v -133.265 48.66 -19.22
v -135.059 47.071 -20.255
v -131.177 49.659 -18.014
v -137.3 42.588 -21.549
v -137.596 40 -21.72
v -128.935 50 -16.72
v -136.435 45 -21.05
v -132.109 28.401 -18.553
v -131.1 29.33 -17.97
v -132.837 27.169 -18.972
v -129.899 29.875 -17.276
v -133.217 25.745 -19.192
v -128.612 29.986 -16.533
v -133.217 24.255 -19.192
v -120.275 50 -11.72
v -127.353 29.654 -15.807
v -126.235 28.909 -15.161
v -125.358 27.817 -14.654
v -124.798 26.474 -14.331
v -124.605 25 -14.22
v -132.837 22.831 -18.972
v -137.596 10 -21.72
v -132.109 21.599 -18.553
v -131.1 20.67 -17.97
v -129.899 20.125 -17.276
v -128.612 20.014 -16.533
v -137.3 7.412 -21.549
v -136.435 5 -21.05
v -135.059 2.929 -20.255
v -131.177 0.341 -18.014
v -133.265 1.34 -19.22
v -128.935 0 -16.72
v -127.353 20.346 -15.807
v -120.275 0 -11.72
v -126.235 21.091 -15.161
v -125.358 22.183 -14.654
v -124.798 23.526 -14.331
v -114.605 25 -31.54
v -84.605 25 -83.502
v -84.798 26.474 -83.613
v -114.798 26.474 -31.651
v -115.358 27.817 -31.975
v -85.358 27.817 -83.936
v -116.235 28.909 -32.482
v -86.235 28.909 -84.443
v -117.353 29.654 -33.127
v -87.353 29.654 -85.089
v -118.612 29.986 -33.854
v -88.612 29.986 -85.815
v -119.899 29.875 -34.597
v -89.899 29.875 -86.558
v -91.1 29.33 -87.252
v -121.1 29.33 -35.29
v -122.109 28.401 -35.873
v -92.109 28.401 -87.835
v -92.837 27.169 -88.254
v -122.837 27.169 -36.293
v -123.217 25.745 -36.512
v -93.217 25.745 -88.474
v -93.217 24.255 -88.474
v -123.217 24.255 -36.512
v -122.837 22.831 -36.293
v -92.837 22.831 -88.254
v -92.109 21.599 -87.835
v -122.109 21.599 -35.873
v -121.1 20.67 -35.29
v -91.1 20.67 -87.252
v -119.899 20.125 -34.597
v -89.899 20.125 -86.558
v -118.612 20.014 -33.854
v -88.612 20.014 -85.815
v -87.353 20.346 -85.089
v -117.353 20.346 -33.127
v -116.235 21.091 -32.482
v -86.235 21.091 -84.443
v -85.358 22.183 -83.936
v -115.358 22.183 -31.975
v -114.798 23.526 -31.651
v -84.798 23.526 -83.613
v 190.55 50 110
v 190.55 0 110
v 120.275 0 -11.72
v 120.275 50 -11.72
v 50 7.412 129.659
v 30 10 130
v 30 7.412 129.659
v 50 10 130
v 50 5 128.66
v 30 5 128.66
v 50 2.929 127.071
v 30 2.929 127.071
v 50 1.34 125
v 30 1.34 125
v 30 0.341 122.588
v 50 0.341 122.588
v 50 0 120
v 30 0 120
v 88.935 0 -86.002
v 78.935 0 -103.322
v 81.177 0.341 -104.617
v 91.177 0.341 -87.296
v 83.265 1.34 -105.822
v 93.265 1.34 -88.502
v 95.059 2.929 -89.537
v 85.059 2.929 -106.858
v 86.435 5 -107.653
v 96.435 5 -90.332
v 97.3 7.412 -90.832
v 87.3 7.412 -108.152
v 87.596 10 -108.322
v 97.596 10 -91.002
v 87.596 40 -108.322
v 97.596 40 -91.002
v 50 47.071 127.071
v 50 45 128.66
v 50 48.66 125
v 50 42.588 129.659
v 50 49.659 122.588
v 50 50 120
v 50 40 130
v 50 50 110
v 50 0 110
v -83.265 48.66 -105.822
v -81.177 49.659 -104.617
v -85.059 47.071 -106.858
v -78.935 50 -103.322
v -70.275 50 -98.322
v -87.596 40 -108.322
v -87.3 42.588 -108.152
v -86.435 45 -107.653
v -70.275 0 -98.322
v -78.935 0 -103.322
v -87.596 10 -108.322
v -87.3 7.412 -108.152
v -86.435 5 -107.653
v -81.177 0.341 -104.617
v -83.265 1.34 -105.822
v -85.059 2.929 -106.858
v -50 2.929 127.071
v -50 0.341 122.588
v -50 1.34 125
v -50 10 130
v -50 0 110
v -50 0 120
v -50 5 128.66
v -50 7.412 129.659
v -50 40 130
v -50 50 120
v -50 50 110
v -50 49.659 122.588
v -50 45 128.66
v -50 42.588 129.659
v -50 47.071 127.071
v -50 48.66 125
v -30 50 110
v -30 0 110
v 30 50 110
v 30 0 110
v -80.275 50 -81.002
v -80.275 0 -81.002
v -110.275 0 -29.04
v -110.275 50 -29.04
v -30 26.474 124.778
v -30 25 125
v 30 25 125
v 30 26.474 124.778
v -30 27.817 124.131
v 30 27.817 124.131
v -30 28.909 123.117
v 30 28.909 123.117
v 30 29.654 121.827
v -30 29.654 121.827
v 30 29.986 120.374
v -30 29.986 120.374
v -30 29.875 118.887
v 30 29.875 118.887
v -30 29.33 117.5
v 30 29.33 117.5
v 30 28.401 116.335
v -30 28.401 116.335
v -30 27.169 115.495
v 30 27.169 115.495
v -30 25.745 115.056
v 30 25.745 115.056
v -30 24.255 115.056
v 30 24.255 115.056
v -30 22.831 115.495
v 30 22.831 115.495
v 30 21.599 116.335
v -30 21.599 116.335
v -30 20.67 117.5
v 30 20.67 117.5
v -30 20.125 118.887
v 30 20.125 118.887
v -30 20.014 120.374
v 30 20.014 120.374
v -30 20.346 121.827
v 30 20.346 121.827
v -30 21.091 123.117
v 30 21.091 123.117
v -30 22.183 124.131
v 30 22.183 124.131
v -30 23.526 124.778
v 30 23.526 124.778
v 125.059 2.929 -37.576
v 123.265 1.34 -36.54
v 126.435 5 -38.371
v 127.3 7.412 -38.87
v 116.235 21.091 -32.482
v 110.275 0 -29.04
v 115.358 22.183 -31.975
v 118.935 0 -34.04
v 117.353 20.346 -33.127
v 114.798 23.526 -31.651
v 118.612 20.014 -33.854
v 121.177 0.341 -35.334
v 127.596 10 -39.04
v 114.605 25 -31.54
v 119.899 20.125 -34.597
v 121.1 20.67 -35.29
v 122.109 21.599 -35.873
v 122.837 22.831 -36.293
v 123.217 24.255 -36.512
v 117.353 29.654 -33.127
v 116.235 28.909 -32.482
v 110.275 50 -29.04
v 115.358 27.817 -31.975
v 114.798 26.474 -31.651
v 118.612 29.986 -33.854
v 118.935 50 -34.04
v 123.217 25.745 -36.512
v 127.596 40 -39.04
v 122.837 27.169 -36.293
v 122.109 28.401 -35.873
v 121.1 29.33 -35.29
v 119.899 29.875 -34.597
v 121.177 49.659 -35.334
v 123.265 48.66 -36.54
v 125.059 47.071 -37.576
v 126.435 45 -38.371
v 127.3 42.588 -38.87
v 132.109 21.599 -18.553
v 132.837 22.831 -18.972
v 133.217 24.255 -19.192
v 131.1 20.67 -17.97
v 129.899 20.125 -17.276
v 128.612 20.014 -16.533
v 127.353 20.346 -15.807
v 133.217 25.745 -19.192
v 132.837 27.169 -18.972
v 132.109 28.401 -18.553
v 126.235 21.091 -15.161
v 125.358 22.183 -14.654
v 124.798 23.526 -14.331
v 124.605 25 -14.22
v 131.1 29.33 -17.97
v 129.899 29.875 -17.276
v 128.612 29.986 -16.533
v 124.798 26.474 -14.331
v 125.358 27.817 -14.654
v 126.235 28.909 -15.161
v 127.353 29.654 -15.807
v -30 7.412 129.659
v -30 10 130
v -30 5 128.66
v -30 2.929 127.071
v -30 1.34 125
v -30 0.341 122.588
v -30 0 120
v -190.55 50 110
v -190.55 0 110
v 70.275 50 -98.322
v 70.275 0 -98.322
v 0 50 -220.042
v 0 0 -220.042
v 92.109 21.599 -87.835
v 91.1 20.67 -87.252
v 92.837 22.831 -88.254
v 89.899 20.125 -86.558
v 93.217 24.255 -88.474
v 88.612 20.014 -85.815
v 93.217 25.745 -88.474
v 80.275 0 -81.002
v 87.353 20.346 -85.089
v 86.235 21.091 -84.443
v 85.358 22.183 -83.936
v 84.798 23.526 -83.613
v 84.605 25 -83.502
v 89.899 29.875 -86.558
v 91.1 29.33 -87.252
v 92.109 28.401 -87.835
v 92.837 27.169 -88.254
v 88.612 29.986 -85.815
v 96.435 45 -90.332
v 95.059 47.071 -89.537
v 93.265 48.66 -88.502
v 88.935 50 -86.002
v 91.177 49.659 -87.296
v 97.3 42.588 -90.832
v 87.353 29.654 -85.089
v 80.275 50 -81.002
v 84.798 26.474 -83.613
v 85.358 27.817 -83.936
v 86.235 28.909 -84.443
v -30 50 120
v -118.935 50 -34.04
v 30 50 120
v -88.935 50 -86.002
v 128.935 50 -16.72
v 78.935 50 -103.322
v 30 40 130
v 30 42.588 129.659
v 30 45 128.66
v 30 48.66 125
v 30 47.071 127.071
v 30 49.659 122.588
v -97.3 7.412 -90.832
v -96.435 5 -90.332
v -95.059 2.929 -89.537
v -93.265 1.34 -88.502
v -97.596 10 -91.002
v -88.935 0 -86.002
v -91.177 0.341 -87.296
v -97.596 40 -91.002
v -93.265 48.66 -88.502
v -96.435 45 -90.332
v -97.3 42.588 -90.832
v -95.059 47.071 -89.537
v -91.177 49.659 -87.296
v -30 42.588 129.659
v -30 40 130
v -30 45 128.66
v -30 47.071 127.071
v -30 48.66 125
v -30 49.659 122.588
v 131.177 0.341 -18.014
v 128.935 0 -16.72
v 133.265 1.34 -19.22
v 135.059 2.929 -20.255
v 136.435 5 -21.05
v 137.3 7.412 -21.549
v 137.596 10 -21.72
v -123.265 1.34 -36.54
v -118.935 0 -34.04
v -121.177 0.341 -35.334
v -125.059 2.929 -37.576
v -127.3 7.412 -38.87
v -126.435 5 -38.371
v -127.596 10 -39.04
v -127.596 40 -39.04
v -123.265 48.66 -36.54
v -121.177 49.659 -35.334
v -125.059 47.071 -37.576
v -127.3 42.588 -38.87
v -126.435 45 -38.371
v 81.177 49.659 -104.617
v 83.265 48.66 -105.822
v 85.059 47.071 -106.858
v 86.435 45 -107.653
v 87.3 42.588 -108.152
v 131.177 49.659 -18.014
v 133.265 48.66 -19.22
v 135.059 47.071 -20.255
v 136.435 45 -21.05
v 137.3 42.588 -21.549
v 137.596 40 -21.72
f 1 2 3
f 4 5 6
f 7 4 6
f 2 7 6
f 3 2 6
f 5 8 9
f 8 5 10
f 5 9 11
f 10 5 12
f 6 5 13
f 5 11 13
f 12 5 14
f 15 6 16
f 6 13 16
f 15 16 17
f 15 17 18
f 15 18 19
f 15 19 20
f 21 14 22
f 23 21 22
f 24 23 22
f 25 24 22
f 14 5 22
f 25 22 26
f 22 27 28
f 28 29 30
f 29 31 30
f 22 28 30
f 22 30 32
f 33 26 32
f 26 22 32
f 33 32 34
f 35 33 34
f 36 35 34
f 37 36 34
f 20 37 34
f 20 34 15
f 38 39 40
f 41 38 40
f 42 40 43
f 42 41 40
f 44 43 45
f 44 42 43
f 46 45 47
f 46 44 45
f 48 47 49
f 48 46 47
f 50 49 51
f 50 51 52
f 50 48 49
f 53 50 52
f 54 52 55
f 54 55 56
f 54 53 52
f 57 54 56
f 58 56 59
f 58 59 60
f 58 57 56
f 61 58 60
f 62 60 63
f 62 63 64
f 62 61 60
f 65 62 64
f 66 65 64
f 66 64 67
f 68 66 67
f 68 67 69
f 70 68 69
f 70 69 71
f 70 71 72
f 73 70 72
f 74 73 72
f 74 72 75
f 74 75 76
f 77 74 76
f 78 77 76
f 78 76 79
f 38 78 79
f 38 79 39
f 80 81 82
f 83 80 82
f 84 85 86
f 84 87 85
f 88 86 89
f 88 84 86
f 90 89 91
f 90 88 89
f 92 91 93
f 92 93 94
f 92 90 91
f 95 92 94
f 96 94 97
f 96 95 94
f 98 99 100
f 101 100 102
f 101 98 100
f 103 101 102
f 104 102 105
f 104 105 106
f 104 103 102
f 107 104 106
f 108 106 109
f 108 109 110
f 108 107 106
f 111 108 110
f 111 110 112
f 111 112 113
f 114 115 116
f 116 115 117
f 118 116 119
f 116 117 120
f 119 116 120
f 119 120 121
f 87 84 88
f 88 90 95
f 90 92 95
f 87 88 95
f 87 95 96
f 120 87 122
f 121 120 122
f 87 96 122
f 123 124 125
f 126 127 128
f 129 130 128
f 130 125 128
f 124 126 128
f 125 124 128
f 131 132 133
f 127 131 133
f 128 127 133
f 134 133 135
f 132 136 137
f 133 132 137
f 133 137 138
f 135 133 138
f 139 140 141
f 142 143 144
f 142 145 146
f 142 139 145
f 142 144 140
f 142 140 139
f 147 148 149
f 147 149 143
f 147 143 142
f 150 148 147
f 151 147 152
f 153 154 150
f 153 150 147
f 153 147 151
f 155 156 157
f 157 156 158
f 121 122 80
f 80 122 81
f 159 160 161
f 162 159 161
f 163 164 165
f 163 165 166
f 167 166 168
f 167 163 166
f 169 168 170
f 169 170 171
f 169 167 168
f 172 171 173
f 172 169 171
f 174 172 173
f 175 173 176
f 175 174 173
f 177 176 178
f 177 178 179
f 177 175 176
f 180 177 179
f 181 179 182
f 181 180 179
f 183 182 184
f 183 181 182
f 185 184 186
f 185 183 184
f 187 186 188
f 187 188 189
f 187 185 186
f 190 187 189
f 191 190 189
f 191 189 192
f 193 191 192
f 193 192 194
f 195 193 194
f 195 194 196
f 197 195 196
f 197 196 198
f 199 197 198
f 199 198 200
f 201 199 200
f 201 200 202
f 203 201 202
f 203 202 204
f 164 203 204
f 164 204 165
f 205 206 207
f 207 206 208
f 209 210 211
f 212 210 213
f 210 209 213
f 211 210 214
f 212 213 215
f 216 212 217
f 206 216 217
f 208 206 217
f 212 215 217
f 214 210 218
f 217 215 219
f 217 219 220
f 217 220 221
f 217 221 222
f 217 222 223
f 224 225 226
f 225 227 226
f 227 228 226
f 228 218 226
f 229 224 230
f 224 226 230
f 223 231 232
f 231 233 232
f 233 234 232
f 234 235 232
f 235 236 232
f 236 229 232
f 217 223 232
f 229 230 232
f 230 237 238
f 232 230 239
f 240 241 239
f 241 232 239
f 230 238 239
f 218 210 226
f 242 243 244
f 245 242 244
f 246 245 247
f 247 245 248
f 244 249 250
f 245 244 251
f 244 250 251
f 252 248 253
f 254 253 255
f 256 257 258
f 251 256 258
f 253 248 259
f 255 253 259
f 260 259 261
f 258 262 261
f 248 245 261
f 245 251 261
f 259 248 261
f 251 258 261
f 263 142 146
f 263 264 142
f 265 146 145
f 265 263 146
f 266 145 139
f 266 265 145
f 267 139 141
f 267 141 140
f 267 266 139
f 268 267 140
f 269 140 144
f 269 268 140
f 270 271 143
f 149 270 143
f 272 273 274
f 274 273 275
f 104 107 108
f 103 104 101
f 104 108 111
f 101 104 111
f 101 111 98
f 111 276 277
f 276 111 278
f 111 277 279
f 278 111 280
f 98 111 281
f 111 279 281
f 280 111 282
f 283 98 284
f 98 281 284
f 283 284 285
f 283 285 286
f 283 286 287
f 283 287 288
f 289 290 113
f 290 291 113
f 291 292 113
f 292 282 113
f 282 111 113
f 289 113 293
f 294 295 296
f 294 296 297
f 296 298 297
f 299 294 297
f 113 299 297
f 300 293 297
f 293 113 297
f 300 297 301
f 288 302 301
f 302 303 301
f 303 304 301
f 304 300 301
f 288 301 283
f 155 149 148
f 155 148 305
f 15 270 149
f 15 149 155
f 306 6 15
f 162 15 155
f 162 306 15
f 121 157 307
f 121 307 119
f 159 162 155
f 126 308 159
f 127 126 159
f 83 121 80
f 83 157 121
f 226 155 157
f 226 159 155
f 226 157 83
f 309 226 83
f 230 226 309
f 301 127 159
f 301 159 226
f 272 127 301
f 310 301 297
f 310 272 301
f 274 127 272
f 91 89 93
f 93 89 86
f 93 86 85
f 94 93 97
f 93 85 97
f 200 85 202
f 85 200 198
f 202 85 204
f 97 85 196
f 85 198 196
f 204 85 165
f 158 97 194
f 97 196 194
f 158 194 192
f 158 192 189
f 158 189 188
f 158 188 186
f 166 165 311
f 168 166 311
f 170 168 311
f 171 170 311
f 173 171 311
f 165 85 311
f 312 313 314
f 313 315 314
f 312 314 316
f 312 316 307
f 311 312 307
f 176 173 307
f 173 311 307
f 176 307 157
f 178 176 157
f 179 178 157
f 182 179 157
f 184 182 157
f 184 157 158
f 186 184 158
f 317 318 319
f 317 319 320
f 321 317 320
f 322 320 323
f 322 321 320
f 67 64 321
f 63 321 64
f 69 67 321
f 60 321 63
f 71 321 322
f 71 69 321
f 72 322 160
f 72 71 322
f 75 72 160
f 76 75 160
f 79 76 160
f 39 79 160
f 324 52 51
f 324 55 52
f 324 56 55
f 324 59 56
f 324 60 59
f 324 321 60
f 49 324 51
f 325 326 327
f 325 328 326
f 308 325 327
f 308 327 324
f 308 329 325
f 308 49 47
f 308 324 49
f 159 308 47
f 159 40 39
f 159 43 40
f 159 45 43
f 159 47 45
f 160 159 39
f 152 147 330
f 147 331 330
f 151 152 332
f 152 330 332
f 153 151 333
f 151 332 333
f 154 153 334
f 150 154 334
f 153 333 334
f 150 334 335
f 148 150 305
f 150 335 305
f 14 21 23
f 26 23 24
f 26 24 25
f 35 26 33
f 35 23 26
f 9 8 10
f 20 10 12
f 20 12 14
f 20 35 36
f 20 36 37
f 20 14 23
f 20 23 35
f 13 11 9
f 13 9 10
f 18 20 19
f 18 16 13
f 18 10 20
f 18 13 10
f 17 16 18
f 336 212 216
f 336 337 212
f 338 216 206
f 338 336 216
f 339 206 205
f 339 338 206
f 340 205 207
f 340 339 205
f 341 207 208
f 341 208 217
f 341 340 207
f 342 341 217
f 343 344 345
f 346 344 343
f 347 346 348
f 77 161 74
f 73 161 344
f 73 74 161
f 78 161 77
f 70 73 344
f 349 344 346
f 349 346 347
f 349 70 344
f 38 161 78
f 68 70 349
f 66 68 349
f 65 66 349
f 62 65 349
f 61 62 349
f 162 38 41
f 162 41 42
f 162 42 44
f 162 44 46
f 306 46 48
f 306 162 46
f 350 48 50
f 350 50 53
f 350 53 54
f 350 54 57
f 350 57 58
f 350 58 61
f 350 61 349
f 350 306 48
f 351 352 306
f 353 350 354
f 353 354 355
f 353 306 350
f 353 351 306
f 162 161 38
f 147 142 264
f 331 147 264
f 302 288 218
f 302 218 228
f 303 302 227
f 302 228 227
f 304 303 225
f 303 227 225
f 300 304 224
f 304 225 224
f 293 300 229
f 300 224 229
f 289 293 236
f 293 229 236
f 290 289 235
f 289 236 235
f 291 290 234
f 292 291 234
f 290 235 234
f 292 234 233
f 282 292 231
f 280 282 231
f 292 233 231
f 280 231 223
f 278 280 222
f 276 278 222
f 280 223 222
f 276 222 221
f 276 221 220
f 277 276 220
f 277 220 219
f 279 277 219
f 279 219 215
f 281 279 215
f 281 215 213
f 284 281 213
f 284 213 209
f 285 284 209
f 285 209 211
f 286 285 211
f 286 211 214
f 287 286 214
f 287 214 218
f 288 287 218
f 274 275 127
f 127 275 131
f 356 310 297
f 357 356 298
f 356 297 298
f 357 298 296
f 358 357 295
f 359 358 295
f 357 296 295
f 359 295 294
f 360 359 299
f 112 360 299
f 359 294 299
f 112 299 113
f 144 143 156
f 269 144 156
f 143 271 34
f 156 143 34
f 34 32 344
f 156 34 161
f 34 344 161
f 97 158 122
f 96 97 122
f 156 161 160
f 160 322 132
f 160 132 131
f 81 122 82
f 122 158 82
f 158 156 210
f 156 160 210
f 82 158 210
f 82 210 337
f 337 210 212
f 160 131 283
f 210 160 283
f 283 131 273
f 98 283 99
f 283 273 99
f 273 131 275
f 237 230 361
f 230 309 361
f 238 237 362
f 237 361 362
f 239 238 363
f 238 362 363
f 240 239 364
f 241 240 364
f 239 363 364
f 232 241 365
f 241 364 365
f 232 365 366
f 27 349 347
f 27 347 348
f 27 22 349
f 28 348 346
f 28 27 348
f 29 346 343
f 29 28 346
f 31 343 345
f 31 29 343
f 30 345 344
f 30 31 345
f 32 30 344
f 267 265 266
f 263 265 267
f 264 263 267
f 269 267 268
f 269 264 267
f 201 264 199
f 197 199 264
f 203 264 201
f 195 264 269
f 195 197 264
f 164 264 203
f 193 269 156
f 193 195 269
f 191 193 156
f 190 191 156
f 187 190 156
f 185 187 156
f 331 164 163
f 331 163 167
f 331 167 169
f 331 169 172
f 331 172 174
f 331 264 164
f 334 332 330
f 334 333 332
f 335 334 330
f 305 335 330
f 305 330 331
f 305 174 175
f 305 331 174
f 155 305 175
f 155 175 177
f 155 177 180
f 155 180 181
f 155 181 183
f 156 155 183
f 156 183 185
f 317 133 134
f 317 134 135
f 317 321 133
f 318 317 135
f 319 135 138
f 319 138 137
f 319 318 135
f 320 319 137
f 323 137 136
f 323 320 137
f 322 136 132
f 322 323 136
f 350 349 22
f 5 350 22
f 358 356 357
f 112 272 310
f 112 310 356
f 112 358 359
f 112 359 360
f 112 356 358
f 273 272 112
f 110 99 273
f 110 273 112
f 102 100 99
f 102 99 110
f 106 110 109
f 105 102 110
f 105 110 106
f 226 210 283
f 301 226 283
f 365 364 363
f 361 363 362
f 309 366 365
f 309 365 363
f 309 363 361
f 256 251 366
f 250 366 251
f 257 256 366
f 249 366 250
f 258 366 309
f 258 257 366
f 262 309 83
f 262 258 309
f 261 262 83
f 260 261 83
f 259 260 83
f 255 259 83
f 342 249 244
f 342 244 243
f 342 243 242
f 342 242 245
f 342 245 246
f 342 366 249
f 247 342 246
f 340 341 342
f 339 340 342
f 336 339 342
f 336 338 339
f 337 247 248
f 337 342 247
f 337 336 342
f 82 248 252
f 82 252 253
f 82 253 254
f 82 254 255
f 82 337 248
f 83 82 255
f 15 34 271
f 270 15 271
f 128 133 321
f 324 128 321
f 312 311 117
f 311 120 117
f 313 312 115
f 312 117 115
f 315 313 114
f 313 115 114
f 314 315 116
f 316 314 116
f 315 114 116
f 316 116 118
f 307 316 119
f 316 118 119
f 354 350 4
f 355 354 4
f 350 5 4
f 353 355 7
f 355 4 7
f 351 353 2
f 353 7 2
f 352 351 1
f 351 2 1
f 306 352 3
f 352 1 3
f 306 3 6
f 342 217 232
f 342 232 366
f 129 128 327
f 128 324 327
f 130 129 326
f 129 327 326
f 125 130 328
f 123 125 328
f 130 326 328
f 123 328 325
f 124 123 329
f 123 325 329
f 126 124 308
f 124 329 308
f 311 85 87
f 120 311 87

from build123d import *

# Parameters (mm, degrees)
BOSS_EXTRUDE1_DEPTH   = 50
BOSS_EXTRUDE2_DEPTH   = 50
BOSS_EXTRUDE2_2_DEPTH = 50
SKETCH3_W             = 100
SKETCH3_H             = 20
BOSS_EXTRUDE2_3_DEPTH = 50
SKETCH4_W             = 60
SKETCH4_H             = 20
CUT_EXTRUDE1_DEPTH    = 50
FILLET1_R             = 10
FILLET2_R             = 10
FILLET3_R             = 10
FILLET4_R             = 10
FILLET5_R             = 10
FILLET6_R             = 10
FILLET7_R             = 10
SKETCH5_R             = 5
BOSS_EXTRUDE3_DEPTH   = 80
SKETCH6_R             = 5
BOSS_EXTRUDE4_DEPTH   = 80


with BuildPart() as part:
    # Sketch1 → Boss-Extrude1 (new body)
    with BuildSketch(Plane(origin=(0, 0, 0), x_dir=(1, 0, 0), z_dir=(0, 1, 0))):
        Polygon((-190.55, -110), (190.55, -110), (0, 220.042281382), align=None)
    extrude(amount=BOSS_EXTRUDE1_DEPTH)


with BuildPart() as body_2:
    # Sketch3 → Boss-Extrude2 (new body)
    with BuildSketch(Plane(origin=(0, 0, 0), x_dir=(1, 0, 0), z_dir=(0, 1, 0))):
        Polygon((-128.935254038, 16.719870502), (-111.614745962, 6.719870502), (-61.614745962, 93.32241088), (-78.935254038, 103.32241088), align=None)
    extrude(amount=BOSS_EXTRUDE2_DEPTH)


with BuildPart() as body_3:
    # Sketch3 → Boss-Extrude2 2 (new body)
    with BuildSketch(Plane(origin=(0, 0, 0), x_dir=(1, 0, 0), z_dir=(0, 1, 0))):
        Polygon((111.614745962, 6.719870502), (61.614745962, 93.32241088), (78.935254038, 103.32241088), (128.935254038, 16.719870502), align=None)
    extrude(amount=BOSS_EXTRUDE2_2_DEPTH)


with BuildPart() as body_4:
    # Sketch3 → Boss-Extrude2 3 (new body)
    with BuildSketch(Plane(origin=(0, 0, 0), x_dir=(1, 0, 0), z_dir=(0, 1, 0))):
        with Locations((0, -110)):
            Rectangle(SKETCH3_W, SKETCH3_H)
    extrude(amount=BOSS_EXTRUDE2_3_DEPTH)


with BuildPart() as body_2_1:
    # Body-Move/Copy1: read off the stored shape, not the designer's step
    # Body-Move/Copy1: moved
    add(body_2.part.moved(Location((-8.660254, 0, -5))))


with BuildPart() as body_3_1:
    # Body-Move/Copy2: read off the stored shape, not the designer's step
    # Body-Move/Copy2: moved
    add(body_3.part.moved(Location((8.660254, 0, -5))))


with BuildPart() as body_4_1:
    # Body-Move/Copy3: read off the stored shape, not the designer's step
    # Body-Move/Copy3: moved
    add(body_4.part.moved(Location((0, 0, 10))))


with BuildPart() as cut_extrude1_tool:
    # Sketch4 → Cut-Extrude1 (new body)
    with BuildSketch(Plane(origin=(0, 50, 0), x_dir=(1, 0, 0), z_dir=(0, 1, 0))):
        Polygon((-97.595508076, 91.001902805), (-80.275, 81.001902805), (-110.275, 29.040378578), (-127.595508076, 39.040378578), align=None)
        Polygon((127.595508076, 39.040378578), (97.595508076, 91.001902805), (80.275, 81.001902805), (110.275, 29.040378578), align=None)
        with Locations((0, -120)):
            Rectangle(SKETCH4_W, SKETCH4_H)
    extrude(amount=-CUT_EXTRUDE1_DEPTH)


with BuildPart() as body_2_2:
    add(body_2_1.part)

    # Cut-Extrude1: cut by cut_extrude1_tool
    add(cut_extrude1_tool.part, mode=Mode.SUBTRACT)


with BuildPart() as body_3_2:
    add(body_3_1.part)

    # Cut-Extrude1: cut by cut_extrude1_tool
    add(cut_extrude1_tool.part, mode=Mode.SUBTRACT)


with BuildPart() as body_4_2:
    add(body_4_1.part)

    # Cut-Extrude1: cut by cut_extrude1_tool
    add(cut_extrude1_tool.part, mode=Mode.SUBTRACT)


with BuildPart() as cut_extrude1_piece_1:
    # of the separate pieces the step leaves, piece 1, a body of its own (cut_extrude1_pieces)
    add(body_2_2.part.solids().sort_by_distance((-87.595508038, 0, -108.32241088))[0])

    # Fillet1
    fillet1_edges = [cut_extrude1_piece_1.edges().sort_by_distance(p)[0] for p in [
        (-92.595508043, 0, -99.662156834),
        (-92.595508043, 50, -99.662156834),
    ]]
    fillet(fillet1_edges, radius=FILLET1_R)


with BuildPart() as cut_extrude1_piece_2:
    # of the separate pieces the step leaves, piece 2, a body of its own (cut_extrude1_pieces)
    add(body_2_2.part.solids().sort_by_distance((-137.595508038, 0, -21.719870502))[0])

    # Fillet2
    fillet2_edges = [cut_extrude1_piece_2.edges().sort_by_distance(p)[0] for p in [
        (-132.595508043, 0, -30.380124532),
        (-132.595508043, 50, -30.380124532),
    ]]
    fillet(fillet2_edges, radius=FILLET2_R)


with BuildPart() as cut_extrude1_piece_1_of_body_3:
    # of the separate pieces the step leaves, piece 1, a body of its own (cut_extrude1_pieces_of_body_3)
    add(body_3_2.part.solids().sort_by_distance((80.275, 0, -81.001902805))[0])

    # Fillet7
    fillet7_edges = [cut_extrude1_piece_1_of_body_3.edges().sort_by_distance(p)[0] for p in [
        (92.595508043, 0, -99.662156834),
        (92.595508043, 50, -99.662156834),
    ]]
    fillet(fillet7_edges, radius=FILLET7_R)


with BuildPart() as cut_extrude1_piece_2_of_body_3:
    # of the separate pieces the step leaves, piece 2, a body of its own (cut_extrude1_pieces_of_body_3)
    add(body_3_2.part.solids().sort_by_distance((120.274999962, 0, -11.719870502))[0])

    # Fillet6
    fillet6_edges = [cut_extrude1_piece_2_of_body_3.edges().sort_by_distance(p)[0] for p in [
        (132.595508043, 0, -30.380124532),
        (132.595508043, 50, -30.380124532),
    ]]
    fillet(fillet6_edges, radius=FILLET6_R)


with BuildPart() as cut_extrude1_piece_1_of_body_4:
    # of the separate pieces the step leaves, piece 1, a body of its own (cut_extrude1_pieces_of_body_4)
    add(body_4_2.part.solids().sort_by_distance((50, 0, 110))[0])

    # Fillet5
    fillet5_edges = [cut_extrude1_piece_1_of_body_4.edges().sort_by_distance(p)[0] for p in [
        (40, 0, 130),
        (40, 50, 130),
    ]]
    fillet(fillet5_edges, radius=FILLET5_R)


with BuildPart() as cut_extrude1_piece_2_of_body_4:
    # of the separate pieces the step leaves, piece 2, a body of its own (cut_extrude1_pieces_of_body_4)
    add(body_4_2.part.solids().sort_by_distance((-30, 0, 110))[0])

    # Fillet3
    fillet3_edges = [cut_extrude1_piece_2_of_body_4.edges().sort_by_distance(p)[0] for p in [
        (-40, 50, 130),
    ]]
    fillet(fillet3_edges, radius=FILLET3_R)

    # Fillet4
    fillet4_edges = [cut_extrude1_piece_2_of_body_4.edges().sort_by_distance(p)[0] for p in [
        (-40, 0, 130),
    ]]
    fillet(fillet4_edges, radius=FILLET4_R)


with BuildPart() as cut_extrude1_piece_2_of_body_3_1:
    add(cut_extrude1_piece_2_of_body_3.part)

    # Combine1: union Cut-Extrude1 piece 2, Cut-Extrude1 piece 2 of body 4, part, Cut-Extrude1 piece 1 of body 4, Cut-Extrude1 piece 1, Cut-Extrude1 piece 1 of body 3
    add(cut_extrude1_piece_2.part)
    add(cut_extrude1_piece_2_of_body_4.part)
    add(part.part)
    add(cut_extrude1_piece_1_of_body_4.part)
    add(cut_extrude1_piece_1.part)
    add(cut_extrude1_piece_1_of_body_3.part)


with BuildPart() as body_2_2_1:
    # Sketch5 → Boss-Extrude3 (new body)
    with BuildSketch(Plane(origin=(-24.993897208, 0, 43.290699844), x_dir=(0.8660254037844362, 0, 0.5000000000000046), z_dir=(-0.5000000000000044, 0, 0.866025403784436))):
        with Locations((-120.021140691, 25)):
            Circle(SKETCH5_R)
    extrude(amount=-BOSS_EXTRUDE3_DEPTH)


with BuildPart() as body_3_2_1:
    # Mirror3: mirrored copy
    add(body_2_2_1.part.mirror(Plane(origin=(0, 0, 0), x_dir=(0, 0, 1), z_dir=(1, 0, 0))))


with BuildPart() as body_2_2_2:
    add(body_2_2_1.part)

    # Combine2: union body 3 2, Cut-Extrude1 piece 2 of body 3
    add(body_3_2_1.part)
    add(cut_extrude1_piece_2_of_body_3_1.part)

    # Sketch6 → Boss-Extrude4 (add)
    with BuildSketch(Plane.ZY.offset(50)):
        with Locations((120, 25)):
            Circle(SKETCH6_R)
    extrude(amount=-BOSS_EXTRUDE4_DEPTH)


solid = body_2_2_2.part
